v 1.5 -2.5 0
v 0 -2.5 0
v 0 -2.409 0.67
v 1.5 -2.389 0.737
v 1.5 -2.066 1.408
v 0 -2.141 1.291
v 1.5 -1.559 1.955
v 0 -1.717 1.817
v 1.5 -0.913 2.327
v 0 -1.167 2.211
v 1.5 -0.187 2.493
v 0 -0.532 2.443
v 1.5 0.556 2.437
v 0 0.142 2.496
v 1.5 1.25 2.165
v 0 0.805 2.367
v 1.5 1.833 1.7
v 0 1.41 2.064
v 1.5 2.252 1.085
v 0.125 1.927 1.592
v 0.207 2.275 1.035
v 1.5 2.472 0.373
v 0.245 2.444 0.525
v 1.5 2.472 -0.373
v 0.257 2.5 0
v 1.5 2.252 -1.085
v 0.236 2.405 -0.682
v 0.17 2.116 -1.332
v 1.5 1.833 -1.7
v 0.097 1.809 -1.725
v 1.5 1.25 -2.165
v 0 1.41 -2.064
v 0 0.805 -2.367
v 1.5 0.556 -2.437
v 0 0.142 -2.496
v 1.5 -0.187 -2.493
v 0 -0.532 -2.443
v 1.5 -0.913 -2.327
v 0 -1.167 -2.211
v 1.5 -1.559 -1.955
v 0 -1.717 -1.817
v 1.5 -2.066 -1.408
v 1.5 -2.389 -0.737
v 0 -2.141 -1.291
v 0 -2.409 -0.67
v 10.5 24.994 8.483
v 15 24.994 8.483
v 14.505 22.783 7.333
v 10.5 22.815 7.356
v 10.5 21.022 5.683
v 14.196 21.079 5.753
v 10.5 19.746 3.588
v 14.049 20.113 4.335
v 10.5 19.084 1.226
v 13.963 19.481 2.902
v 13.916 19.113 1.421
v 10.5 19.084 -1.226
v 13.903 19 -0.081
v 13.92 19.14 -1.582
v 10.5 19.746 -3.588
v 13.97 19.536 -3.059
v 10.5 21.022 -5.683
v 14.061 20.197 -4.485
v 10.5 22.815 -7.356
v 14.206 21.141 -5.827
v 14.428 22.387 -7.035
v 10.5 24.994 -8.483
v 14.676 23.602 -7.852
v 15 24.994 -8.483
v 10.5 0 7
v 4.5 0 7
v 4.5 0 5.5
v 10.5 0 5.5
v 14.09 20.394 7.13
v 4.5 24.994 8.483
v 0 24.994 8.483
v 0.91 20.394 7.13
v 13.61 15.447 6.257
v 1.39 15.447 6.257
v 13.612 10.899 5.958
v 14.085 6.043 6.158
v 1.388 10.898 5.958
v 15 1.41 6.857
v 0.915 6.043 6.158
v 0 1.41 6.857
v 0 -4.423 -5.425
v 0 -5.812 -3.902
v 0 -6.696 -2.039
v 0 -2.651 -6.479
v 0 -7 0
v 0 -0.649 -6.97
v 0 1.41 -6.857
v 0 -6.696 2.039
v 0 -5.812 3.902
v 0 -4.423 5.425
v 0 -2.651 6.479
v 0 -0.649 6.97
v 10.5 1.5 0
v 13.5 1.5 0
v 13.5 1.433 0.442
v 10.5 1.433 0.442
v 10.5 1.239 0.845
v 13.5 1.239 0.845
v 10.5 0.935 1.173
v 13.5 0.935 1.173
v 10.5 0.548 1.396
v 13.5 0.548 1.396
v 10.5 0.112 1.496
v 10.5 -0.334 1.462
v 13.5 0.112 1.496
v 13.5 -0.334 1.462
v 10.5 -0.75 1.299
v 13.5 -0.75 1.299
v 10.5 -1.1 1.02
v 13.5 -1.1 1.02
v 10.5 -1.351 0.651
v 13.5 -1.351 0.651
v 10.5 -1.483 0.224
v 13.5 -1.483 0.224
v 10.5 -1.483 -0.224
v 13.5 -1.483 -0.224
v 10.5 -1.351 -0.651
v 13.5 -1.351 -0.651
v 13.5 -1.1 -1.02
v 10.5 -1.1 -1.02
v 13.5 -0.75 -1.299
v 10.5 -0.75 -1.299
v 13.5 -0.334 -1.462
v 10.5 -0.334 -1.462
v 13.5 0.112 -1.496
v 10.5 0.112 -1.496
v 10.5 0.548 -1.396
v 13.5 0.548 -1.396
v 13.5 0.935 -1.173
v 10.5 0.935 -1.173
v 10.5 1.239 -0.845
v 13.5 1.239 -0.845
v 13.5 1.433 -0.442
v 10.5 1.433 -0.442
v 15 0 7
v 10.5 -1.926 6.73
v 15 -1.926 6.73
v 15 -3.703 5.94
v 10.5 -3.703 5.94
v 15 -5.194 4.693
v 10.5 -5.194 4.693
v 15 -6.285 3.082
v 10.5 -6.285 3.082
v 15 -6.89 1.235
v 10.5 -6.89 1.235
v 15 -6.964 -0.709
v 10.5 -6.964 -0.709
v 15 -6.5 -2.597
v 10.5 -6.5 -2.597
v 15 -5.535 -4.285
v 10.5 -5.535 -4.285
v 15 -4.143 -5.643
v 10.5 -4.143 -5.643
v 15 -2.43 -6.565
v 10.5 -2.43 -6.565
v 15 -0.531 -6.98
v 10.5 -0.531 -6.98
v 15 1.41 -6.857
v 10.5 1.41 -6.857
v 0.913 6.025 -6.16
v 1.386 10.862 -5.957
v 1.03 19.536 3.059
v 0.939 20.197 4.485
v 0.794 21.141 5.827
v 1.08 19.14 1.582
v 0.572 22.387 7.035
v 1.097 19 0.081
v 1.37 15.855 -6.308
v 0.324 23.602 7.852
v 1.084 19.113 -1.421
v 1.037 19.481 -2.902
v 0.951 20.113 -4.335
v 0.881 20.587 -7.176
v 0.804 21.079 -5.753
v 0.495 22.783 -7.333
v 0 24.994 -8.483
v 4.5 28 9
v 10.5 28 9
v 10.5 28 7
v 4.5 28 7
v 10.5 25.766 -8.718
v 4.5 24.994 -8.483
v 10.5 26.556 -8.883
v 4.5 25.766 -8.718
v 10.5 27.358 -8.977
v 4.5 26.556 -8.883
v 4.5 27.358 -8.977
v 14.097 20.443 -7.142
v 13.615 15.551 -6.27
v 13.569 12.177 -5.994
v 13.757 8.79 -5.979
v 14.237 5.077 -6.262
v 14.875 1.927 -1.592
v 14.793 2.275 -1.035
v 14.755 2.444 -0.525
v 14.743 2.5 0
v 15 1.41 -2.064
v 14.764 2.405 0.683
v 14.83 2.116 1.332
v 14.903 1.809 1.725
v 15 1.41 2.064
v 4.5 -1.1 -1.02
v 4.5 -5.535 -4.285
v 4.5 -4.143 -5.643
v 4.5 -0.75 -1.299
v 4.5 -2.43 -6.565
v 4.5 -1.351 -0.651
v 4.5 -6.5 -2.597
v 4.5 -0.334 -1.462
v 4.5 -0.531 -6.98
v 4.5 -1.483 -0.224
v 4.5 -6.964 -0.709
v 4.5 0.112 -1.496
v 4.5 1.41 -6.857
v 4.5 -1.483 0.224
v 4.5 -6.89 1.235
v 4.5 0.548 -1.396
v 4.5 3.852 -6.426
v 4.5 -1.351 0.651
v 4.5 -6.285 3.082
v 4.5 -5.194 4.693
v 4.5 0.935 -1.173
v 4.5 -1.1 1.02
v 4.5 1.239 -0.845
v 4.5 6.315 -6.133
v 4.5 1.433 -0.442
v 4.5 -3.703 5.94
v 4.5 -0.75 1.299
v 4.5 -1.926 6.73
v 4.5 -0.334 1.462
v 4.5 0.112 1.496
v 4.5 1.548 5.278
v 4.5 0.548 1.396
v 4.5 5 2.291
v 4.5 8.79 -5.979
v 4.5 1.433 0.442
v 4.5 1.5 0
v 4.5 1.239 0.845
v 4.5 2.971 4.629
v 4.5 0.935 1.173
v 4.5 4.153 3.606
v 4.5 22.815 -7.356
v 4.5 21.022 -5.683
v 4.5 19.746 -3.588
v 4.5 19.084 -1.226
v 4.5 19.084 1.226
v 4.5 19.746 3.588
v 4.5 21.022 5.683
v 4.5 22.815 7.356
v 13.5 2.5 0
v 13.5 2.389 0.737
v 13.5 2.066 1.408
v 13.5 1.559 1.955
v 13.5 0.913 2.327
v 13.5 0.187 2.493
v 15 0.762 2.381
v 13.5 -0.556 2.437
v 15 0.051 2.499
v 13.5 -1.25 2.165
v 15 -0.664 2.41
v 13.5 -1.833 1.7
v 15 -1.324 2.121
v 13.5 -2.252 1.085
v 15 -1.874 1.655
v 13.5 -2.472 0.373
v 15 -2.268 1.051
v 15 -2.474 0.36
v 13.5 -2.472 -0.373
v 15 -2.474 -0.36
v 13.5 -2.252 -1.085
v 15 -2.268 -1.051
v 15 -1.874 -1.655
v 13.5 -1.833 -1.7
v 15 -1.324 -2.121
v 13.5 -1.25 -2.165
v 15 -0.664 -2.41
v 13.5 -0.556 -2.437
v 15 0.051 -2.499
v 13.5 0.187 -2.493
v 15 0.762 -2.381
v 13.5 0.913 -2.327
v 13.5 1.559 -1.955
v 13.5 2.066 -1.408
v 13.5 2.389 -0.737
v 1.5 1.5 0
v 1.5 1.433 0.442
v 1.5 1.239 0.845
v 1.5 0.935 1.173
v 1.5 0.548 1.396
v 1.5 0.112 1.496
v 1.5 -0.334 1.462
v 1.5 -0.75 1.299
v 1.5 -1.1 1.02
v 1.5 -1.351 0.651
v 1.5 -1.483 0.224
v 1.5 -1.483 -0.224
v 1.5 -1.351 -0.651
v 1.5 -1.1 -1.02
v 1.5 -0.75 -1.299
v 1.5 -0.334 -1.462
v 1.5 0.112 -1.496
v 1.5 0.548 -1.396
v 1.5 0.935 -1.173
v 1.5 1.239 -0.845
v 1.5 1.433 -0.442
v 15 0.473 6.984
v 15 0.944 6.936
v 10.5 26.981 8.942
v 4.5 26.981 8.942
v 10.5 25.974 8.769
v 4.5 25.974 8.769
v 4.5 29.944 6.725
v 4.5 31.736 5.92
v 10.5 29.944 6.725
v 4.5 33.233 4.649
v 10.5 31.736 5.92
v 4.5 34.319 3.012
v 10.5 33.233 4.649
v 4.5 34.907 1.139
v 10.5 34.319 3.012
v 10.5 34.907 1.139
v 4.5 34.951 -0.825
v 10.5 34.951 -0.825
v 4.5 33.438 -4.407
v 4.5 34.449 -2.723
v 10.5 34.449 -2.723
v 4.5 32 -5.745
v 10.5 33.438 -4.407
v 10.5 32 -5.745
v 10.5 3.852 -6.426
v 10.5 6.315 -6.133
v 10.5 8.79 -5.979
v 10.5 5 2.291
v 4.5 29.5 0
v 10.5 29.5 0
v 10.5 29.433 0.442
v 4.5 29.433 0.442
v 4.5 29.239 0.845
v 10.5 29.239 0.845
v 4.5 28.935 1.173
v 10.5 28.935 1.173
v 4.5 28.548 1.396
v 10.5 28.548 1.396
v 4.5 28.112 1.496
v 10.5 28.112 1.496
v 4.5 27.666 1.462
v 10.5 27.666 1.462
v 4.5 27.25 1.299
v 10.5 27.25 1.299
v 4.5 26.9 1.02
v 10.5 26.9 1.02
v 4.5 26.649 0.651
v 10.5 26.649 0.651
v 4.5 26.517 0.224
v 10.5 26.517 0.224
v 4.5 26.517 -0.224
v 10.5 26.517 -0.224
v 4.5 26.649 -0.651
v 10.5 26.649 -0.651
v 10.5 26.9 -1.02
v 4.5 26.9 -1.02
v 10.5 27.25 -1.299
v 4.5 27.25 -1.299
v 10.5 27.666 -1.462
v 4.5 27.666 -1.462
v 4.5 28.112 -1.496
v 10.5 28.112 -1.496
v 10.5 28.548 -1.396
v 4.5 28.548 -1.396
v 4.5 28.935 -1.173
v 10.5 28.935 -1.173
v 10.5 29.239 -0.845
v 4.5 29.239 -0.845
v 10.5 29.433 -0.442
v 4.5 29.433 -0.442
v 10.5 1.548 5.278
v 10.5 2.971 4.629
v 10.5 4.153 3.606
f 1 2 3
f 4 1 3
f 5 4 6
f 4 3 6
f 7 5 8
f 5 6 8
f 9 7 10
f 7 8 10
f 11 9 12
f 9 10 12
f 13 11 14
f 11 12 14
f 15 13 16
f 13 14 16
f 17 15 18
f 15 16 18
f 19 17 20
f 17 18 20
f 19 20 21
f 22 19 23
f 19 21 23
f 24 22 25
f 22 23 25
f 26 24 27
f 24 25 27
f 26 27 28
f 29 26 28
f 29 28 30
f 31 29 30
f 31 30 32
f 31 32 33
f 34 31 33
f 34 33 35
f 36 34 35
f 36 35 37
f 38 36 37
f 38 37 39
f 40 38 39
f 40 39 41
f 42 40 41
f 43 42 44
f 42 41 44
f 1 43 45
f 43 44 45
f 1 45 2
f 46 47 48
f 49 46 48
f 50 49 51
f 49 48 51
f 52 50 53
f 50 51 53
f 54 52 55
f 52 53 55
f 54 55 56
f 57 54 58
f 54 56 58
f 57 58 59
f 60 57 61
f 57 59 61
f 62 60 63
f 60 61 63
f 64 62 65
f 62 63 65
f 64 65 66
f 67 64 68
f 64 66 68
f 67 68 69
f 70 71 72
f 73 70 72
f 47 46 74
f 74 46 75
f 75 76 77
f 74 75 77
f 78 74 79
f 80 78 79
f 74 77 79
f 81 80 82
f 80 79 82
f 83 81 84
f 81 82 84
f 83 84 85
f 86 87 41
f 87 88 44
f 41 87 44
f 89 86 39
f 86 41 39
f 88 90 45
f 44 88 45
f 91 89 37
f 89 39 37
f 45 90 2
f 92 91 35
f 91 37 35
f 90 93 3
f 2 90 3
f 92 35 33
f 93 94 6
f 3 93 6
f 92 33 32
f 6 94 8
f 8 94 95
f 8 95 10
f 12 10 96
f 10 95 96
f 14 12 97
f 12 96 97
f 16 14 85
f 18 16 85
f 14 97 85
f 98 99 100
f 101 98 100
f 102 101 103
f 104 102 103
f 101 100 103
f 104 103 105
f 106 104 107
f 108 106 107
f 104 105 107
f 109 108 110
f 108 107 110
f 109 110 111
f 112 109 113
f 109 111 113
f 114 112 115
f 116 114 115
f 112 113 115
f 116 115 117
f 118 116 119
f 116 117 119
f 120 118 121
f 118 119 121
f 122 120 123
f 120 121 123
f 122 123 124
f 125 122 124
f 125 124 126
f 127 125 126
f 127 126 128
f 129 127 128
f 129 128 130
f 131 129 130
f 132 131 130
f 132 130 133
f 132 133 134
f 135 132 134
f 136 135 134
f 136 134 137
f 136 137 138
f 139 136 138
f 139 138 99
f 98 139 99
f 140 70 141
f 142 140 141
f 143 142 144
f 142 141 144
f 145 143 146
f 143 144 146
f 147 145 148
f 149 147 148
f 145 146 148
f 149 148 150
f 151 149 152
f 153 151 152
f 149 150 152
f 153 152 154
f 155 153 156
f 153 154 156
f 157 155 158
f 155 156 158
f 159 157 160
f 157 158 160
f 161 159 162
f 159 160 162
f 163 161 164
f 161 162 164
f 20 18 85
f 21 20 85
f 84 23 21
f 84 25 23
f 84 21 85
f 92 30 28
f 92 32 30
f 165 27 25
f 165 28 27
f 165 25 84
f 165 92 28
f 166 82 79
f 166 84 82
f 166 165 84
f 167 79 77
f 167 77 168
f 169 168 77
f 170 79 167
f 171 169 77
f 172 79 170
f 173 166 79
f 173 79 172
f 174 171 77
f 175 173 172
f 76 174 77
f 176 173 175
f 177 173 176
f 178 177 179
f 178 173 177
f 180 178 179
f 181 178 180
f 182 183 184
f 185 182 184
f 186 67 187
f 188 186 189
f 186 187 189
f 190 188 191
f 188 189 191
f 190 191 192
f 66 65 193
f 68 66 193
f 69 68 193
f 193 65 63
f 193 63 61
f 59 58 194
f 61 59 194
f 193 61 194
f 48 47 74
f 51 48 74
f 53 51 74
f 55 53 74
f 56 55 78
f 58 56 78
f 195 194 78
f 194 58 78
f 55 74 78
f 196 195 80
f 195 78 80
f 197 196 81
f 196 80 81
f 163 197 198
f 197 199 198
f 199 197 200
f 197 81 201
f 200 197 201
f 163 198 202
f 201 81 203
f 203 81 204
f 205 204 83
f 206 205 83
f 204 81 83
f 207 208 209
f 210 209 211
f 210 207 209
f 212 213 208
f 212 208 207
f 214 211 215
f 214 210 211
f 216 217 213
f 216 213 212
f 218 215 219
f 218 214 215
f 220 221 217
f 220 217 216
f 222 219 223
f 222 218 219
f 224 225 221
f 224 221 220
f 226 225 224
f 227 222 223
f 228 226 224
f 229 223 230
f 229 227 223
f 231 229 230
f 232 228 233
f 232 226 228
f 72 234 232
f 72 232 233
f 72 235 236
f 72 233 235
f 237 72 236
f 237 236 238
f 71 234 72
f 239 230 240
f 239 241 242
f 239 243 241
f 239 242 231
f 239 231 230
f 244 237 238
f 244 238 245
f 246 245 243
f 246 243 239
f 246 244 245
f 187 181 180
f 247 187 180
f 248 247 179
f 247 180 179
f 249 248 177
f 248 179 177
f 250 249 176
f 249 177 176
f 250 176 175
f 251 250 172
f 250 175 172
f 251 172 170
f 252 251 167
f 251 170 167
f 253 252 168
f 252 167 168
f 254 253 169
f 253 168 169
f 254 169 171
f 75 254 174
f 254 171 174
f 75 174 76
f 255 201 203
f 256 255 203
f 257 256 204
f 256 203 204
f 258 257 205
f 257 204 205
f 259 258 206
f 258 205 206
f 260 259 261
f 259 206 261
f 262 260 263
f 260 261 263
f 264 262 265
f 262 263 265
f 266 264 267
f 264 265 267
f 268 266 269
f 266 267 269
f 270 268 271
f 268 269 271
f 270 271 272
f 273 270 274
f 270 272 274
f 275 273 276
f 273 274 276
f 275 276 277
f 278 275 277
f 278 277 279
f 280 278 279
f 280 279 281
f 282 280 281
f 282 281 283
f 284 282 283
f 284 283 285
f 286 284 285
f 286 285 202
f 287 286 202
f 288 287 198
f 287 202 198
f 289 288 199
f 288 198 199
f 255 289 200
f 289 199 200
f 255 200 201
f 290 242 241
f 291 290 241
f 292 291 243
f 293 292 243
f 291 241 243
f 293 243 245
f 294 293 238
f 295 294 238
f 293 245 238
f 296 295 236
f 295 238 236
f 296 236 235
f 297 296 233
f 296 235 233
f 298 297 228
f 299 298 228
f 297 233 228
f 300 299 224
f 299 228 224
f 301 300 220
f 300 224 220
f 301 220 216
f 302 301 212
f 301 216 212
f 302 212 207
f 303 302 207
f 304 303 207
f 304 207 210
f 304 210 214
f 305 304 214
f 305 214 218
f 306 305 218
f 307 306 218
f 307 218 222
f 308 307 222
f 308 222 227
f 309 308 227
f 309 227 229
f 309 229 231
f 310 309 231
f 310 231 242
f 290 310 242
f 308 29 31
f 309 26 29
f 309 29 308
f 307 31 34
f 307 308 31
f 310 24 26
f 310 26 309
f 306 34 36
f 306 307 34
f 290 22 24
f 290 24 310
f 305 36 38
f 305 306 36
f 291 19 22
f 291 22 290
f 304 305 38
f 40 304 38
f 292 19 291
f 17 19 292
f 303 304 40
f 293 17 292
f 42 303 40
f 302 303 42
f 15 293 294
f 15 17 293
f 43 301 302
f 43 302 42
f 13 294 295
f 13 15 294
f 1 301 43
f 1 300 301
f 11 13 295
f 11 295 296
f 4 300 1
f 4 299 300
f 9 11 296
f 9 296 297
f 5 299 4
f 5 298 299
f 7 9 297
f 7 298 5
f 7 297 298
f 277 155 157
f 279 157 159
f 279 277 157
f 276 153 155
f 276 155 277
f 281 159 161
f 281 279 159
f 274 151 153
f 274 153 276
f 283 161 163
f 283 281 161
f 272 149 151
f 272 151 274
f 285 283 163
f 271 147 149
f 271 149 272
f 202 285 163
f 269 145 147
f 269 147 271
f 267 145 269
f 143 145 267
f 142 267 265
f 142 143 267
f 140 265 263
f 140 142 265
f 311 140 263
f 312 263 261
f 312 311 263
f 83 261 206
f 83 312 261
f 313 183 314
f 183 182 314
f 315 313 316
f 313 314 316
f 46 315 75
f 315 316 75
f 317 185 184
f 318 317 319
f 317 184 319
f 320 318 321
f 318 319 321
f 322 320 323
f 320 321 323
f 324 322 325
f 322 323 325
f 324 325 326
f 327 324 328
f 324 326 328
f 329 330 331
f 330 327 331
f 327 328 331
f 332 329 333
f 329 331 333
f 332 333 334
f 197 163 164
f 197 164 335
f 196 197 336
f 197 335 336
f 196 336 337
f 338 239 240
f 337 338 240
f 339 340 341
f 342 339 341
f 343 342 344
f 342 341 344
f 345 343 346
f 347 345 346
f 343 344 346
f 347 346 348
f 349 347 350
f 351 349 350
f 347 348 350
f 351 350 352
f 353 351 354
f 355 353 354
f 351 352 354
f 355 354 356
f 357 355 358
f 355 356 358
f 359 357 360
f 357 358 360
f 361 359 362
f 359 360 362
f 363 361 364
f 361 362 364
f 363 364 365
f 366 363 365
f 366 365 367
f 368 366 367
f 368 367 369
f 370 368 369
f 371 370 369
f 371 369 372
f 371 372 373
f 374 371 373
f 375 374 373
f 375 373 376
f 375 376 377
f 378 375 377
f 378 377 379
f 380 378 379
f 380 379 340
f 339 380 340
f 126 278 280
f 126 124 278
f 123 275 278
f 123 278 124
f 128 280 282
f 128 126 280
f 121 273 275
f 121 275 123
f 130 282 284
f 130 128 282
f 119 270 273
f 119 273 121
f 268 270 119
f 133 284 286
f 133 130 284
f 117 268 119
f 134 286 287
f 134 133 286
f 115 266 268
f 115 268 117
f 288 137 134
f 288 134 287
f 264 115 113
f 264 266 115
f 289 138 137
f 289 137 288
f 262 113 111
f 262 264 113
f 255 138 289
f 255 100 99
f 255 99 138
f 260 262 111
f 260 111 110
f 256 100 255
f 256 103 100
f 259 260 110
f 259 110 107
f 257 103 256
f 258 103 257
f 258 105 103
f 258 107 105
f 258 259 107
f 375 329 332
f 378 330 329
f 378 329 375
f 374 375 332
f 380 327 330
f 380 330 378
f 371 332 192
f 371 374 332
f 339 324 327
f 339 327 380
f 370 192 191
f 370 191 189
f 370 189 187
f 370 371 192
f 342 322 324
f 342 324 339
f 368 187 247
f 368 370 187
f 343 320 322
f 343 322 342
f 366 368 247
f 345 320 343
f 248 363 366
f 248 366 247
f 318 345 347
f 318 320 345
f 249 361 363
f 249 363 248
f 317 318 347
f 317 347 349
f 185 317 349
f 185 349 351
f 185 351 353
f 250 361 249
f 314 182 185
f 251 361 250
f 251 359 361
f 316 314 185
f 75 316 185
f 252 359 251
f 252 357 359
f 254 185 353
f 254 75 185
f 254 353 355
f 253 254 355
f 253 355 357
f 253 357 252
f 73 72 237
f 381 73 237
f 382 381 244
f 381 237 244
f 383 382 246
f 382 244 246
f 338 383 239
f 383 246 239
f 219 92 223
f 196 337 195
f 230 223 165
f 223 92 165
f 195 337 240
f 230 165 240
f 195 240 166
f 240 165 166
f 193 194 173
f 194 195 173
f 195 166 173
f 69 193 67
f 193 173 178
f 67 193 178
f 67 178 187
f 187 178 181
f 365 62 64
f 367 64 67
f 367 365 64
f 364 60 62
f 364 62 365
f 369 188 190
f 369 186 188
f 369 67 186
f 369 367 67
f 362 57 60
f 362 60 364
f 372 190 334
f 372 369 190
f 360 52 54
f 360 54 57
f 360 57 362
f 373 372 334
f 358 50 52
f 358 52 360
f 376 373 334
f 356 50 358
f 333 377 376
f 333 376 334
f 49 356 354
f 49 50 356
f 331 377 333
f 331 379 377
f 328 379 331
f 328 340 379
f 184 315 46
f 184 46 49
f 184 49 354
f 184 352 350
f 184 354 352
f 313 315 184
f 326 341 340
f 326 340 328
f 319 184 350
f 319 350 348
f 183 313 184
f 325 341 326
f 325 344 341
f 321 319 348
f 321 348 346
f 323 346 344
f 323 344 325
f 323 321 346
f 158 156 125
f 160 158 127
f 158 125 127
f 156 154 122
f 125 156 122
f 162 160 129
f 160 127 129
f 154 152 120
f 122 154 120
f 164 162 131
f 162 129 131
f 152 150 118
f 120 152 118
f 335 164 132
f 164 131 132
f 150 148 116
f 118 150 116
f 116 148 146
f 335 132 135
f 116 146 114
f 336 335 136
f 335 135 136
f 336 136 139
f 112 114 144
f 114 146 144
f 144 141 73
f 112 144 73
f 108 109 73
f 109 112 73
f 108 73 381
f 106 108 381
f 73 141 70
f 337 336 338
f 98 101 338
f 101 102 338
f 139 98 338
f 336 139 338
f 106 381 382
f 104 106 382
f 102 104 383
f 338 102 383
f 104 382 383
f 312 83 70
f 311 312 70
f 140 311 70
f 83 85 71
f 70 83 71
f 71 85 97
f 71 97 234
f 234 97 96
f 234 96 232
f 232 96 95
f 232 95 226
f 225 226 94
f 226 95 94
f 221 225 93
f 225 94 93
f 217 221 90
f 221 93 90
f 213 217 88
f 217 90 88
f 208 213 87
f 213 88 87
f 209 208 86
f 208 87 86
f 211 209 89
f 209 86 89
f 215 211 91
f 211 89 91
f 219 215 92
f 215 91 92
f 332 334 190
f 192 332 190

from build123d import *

# Parameters (mm, degrees)
F1_DEPTH  = 4.5
F3_DEPTH  = 6
F5_DEPTH  = 4.5
F6_R      = 9
F7_DEPTH  = 4.5
F8_R      = 9
F9_DEPTH  = 4.5
F11_DEPTH = 10.501
F12_R     = 1.5
F13_DEPTH = 15.001
F14_R     = 2.5
F15_DEPTH = 1.5
F16_R     = 2.5
F17_DEPTH = 1.5
F18_R     = 48.9418090598
F19_DEPTH = 12.5


with BuildPart() as f1:
    # F0 (on Right) → F1 (new body)
    with BuildSketch(Plane.YZ):
        with BuildLine():
            ThreePointArc((24.9939795279, 8.4831504125), (13.3131715809, 6.0580646826), (1.4100295584, 6.8565163636))
            ThreePointArc((1.4100295584, 6.8565163636), (-7, 0), (1.4100295584, -6.8565163636))
            ThreePointArc((1.4100295584, -6.8565163636), (13.3131715809, -6.0580646826), (24.9939795279, -8.4831504125))
            ThreePointArc((24.9939795279, -8.4831504125), (37, 0), (24.9939795279, 8.4831504125))
        make_face()
    extrude(amount=F1_DEPTH)

    # F2 (on face) → F3 (join)
    with BuildSketch(Plane.YZ.offset(4.5)):
        with BuildLine():
            ThreePointArc((24.9939795279, 8.4831504125), (13.3131715809, 6.0580646826), (1.4100295584, 6.8565163636))
            ThreePointArc((1.4100295584, 6.8565163636), (0.7086555774, 6.9640367082), (0, 7))
            Line((0, 7), (0, 5.5))
            ThreePointArc((0, 5.5), (2.9705148408, 4.628827236), (5, 2.2912878475))
            Line((5, 2.2912878475), (8.7899052004, -5.9789633228))
            ThreePointArc((8.7899052004, -5.9789633228), (17.0094937021, -6.4704065852), (24.9939795279, -8.4831504125))
            ThreePointArc((24.9939795279, -8.4831504125), (37, 0), (24.9939795279, 8.4831504125))
        make_face()
    extrude(amount=F3_DEPTH)

    # F4 (on face) → F5 (join)
    with BuildSketch(Plane.YZ.offset(10.5)):
        with BuildLine():
            ThreePointArc((1.4100295584, 6.8565163636), (0.7086555774, 6.9640367082), (0, 7))
            ThreePointArc((0, 7), (-6.9640367082, -0.7086555774), (1.4100295584, -6.8565163636))
            ThreePointArc((1.4100295584, -6.8565163636), (5.0814258107, -6.261812549), (8.7899052004, -5.9789633228))
            ThreePointArc((8.7899052004, -5.9789633228), (17.0094937021, -6.4704065852), (24.9939795279, -8.4831504125))
            ThreePointArc((24.9939795279, -8.4831504125), (26.6900035871, -8.9041512452), (28.4354151468, -8.9894612547))
            ThreePointArc((28.4354151468, -8.9894612547), (36.8303478161, 1.7392404799), (24.9939795279, 8.4831504125))
            ThreePointArc((24.9939795279, 8.4831504125), (13.3131715809, 6.0580646826), (1.4100295584, 6.8565163636))
        make_face()
    extrude(amount=F5_DEPTH)

    # F6 (on face) → F7 (cut)
    with BuildSketch(Plane.YZ.offset(15)):
        with Locations((28, 0)):
            Circle(F6_R)
    extrude(amount=-F7_DEPTH, mode=Mode.SUBTRACT)

    # F8 (on face) → F9 (cut)
    with BuildSketch(Plane(origin=(0, 0, 0), x_dir=(0, -1, 0), z_dir=(-1, 0, 0))):
        with Locations((-28, 0)):
            Circle(F8_R)
    extrude(amount=-F9_DEPTH, mode=Mode.SUBTRACT)

    # F10 (on face) → F11 (cut, through all)
    with BuildSketch(Plane.YZ.offset(10.5)):
        with BuildLine():
            ThreePointArc((28, 7), (34.6787700412, 2.0961943462), (32, -5.7445626465))
            Line((32, -5.7445626465), (27.3576923402, -8.9770507891))
            ThreePointArc((27.3576923402, -8.9770507891), (36.9942608674, -0.3213587544), (28, 9))
            Line((28, 9), (28, 7))
        make_face()
    extrude(amount=-F11_DEPTH, mode=Mode.SUBTRACT)

    # F12 (on face) → F13 (cut, through all)
    with BuildSketch(Plane.YZ.offset(15)):
        Circle(F12_R)
        with Locations((28, 0)):
            Circle(F12_R)
    extrude(amount=-F13_DEPTH, mode=Mode.SUBTRACT)

    # F14 (on face) → F15 (cut)
    with BuildSketch(Plane.YZ.offset(15)):
        Circle(F14_R)
    extrude(amount=-F15_DEPTH, mode=Mode.SUBTRACT)

    # F16 (on face) → F17 (cut)
    with BuildSketch(Plane(origin=(0, 0, 0), x_dir=(0, -1, 0), z_dir=(-1, 0, 0))):
        Circle(F16_R)
    extrude(amount=-F17_DEPTH, mode=Mode.SUBTRACT)

    # F18 (on Top) → F19 (cut, symmetric)
    with BuildSketch(Plane.XY):
        with Locations((-47.5, 13.2020045432)):
            Circle(F18_R)
        with Locations((62.5, 13.2020045432)):
            Circle(F18_R)
    extrude(amount=F19_DEPTH, both=True, mode=Mode.SUBTRACT)


solid = f1.part
